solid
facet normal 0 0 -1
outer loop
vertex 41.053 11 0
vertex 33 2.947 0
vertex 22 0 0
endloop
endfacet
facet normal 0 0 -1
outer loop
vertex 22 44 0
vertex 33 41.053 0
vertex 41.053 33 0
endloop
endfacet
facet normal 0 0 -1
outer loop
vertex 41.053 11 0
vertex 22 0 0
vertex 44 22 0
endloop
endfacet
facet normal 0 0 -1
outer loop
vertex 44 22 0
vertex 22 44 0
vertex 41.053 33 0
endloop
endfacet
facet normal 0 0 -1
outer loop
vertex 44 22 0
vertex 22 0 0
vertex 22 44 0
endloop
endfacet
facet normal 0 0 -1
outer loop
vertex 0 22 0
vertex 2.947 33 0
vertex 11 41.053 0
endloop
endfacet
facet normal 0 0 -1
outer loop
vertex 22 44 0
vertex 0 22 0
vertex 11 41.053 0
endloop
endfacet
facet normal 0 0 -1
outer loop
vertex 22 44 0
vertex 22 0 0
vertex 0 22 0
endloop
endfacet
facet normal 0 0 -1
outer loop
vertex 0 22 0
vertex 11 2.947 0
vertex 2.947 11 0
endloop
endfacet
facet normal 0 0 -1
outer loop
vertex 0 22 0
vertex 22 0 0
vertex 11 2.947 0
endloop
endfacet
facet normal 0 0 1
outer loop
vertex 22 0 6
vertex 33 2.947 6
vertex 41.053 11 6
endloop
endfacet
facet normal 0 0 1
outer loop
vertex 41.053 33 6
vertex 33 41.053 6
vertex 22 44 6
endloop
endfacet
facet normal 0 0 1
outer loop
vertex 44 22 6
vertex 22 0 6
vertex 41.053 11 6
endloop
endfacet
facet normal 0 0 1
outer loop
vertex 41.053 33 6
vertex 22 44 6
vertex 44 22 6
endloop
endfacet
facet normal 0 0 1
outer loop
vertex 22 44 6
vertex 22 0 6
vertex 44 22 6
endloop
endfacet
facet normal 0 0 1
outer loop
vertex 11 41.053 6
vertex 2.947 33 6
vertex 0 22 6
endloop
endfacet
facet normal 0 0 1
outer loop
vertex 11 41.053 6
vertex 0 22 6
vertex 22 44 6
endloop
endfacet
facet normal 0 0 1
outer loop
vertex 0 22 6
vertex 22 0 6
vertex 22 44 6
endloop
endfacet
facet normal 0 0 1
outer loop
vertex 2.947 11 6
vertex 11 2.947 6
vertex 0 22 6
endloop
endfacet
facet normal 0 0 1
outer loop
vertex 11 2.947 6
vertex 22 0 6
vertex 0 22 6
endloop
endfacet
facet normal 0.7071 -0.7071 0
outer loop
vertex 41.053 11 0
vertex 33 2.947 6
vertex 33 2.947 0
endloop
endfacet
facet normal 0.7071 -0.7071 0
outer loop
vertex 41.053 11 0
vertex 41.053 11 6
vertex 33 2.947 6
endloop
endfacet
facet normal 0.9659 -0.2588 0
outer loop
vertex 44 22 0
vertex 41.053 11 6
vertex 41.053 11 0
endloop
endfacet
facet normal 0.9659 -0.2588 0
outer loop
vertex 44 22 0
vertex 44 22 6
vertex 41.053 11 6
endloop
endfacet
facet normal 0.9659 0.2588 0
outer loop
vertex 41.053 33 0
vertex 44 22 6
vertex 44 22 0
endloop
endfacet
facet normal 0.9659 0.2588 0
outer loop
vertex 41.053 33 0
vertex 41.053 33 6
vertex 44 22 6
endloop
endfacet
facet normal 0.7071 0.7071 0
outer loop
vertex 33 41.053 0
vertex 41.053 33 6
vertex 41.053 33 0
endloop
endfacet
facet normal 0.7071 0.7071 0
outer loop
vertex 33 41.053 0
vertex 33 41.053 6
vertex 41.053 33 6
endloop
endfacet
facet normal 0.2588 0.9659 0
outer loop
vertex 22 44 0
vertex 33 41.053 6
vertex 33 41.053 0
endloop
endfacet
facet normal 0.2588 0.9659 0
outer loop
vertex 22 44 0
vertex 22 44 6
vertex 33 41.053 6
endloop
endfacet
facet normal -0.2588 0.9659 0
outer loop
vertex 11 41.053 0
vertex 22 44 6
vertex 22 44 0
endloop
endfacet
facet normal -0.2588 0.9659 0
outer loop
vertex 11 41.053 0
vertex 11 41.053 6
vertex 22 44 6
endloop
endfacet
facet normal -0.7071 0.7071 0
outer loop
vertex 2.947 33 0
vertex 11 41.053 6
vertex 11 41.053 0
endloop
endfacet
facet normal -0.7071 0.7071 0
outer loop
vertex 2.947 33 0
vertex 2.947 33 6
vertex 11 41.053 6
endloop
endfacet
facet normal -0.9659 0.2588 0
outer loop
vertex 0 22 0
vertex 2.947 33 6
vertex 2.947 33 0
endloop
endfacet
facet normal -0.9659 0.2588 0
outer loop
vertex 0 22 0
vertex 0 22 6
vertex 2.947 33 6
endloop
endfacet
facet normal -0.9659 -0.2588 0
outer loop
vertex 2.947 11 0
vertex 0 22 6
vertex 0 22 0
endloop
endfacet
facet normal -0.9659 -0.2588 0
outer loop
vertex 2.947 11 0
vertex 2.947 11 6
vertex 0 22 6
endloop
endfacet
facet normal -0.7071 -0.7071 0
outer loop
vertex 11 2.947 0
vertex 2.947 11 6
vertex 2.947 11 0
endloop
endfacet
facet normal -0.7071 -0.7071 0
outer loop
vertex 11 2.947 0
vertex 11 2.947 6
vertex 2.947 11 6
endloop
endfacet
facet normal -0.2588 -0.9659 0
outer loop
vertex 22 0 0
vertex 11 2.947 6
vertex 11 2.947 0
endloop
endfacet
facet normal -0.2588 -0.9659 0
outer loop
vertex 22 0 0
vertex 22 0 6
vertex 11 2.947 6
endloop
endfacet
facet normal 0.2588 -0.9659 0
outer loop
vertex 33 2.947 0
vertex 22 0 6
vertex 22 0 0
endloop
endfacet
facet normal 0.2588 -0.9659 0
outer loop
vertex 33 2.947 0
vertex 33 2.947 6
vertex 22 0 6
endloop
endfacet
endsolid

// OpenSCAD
$fn = 32;

// ----------------------------------------------------------------------
// Eccentric disc: step, 6 mm thick
// ----------------------------------------------------------------------

// --- parameters (mm) ---
profile_height = 6;       // extrusion height
profile_points = 12;      // points of the closed outline

profile = [[0, 22], [2.947, 11], [11, 2.947], [22, 0], [33, 2.947], [41.053, 11], [44, 22], [41.053, 33], [33, 41.053], [22, 44], [11, 41.053], [2.947, 33]];  // single closed polygon, 12 points, counter clockwise

// --- the one profile operation ---
linear_extrude(height = profile_height) polygon(points = profile);
